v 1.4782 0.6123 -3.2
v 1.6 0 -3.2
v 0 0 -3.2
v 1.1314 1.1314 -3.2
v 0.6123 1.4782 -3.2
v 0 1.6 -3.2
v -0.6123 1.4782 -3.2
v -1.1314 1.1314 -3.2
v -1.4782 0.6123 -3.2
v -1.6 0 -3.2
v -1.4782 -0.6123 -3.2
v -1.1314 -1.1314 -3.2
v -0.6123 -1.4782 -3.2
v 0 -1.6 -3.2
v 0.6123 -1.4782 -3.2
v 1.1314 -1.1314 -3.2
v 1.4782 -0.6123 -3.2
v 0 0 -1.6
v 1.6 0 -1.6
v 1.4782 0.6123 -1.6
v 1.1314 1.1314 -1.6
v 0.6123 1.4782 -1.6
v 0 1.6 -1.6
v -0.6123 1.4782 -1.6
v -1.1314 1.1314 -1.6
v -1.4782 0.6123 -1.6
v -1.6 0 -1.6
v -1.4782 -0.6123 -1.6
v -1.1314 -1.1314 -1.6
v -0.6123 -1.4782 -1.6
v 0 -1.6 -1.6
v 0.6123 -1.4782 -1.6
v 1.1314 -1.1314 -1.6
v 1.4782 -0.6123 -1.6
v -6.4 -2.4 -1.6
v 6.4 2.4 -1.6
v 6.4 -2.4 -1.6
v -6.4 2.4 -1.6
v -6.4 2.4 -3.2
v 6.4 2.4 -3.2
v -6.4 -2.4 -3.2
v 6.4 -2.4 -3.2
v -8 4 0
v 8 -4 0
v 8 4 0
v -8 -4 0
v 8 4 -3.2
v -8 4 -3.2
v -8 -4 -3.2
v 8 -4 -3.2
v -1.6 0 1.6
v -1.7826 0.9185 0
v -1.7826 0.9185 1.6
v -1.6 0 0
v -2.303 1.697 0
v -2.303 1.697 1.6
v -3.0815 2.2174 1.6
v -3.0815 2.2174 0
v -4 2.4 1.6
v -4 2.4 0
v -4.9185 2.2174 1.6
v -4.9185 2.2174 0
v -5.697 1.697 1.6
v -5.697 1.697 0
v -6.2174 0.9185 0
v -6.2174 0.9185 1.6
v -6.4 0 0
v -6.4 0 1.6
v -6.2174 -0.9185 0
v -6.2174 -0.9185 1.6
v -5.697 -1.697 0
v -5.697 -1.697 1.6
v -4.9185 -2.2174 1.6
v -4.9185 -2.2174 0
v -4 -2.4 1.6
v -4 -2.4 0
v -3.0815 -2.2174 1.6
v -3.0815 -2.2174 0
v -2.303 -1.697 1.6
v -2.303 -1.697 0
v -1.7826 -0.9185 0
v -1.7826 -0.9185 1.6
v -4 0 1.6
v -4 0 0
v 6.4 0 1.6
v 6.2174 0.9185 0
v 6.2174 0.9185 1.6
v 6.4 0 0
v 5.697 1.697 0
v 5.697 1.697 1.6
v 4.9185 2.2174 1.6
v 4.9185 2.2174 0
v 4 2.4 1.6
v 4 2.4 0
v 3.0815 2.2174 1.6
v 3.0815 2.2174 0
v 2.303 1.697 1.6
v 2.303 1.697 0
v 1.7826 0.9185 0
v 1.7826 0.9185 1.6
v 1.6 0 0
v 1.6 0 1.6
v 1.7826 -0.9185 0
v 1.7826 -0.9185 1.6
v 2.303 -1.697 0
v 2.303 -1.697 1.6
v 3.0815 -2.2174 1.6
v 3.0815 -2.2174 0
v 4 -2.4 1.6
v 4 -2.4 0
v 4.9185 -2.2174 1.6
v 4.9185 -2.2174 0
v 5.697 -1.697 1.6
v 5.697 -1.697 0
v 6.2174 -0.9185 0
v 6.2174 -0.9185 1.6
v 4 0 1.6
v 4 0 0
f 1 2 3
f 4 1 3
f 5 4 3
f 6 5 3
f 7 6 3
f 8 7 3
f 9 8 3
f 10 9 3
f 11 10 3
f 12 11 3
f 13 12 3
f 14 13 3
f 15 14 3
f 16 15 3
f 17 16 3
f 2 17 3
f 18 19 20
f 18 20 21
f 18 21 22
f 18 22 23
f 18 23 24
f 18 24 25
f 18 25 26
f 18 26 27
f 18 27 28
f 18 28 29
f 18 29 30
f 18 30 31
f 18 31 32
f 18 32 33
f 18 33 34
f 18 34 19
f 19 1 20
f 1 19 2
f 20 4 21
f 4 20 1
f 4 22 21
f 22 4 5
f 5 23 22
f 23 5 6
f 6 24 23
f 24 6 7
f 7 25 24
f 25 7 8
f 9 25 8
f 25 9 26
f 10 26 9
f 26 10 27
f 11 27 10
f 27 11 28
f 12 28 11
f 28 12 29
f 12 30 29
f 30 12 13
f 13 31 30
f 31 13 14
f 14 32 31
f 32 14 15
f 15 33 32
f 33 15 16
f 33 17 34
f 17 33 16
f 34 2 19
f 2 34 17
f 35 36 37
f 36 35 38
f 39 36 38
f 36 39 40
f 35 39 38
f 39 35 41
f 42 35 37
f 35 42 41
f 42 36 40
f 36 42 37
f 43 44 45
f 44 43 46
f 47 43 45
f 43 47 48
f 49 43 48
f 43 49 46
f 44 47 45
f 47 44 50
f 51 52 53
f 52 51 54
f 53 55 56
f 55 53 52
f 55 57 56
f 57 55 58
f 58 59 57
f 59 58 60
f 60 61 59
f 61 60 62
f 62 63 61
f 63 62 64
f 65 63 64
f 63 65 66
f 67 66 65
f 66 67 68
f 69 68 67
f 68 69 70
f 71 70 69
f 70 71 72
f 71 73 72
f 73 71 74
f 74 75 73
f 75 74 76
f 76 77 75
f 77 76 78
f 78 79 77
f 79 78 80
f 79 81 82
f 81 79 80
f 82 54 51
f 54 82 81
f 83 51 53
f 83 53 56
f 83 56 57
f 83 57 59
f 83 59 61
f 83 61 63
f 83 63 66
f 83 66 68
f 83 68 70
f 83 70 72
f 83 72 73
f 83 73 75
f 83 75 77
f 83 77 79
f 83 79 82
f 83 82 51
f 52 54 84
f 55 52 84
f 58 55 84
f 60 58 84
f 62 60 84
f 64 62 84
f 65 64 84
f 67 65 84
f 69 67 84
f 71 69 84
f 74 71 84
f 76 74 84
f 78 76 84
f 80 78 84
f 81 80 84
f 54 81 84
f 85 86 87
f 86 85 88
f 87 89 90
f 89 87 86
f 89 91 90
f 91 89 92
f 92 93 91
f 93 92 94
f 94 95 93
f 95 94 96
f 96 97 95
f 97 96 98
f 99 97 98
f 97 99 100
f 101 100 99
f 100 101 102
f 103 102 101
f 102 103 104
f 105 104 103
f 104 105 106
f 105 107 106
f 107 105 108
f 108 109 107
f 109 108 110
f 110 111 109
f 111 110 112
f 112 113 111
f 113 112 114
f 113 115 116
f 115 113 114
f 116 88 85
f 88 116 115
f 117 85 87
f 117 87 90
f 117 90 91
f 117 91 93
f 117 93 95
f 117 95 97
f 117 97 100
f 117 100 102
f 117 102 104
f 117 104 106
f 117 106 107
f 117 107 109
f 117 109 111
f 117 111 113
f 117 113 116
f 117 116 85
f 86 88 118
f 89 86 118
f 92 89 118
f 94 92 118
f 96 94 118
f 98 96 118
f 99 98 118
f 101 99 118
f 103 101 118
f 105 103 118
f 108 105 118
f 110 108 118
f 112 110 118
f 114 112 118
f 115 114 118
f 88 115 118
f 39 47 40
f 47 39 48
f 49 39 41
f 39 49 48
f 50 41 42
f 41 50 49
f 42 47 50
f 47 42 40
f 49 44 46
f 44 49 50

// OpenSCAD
// file: ../p/stud.scad
use <../lib.scad>
use <4-4cyli.scad>
use <4-4disc.scad>
use <4-4edge.scad>
function ldraw_lib__stud() = [
// 0 Stud
// 0 Name: stud.dat
// 0 Author: James Jessiman
// 0 !LDRAW_ORG Primitive UPDATE 2012-01
// 0 !LICENSE Licensed under CC BY 4.0 : see CAreadme.txt
// 
// 0 BFC CERTIFY CCW
  [0,"BFC","CERTIFY"],
  [0,"BFC","CCW"],
// 
// 0 !HISTORY 2002-04-04 [sbliss] Modified for BFC compliance
// 0 !HISTORY 2002-04-25 [PTadmin] Official Update 2002-02
// 0 !HISTORY 2007-06-24 [PTadmin] Header formatted for Contributor Agreement
// 0 !HISTORY 2008-07-01 [PTadmin] Official Update 2008-01
// 0 !HISTORY 2012-02-16 [Philo] Changed to CCW
// 0 !HISTORY 2012-03-30 [PTadmin] Official Update 2012-01
// 
// 
// 1 16 0 0 0 6 0 0 0 1 0 0 0 6 4-4edge.dat
  [1,16,0,0,0,6,0,0,0,1,0,0,0,6, ldraw_lib__4_4edge()],
// 1 16 0 -4 0 6 0 0 0 1 0 0 0 6 4-4edge.dat
  [1,16,0,-4,0,6,0,0,0,1,0,0,0,6, ldraw_lib__4_4edge()],
// 1 16 0 0 0 6 0 0 0 -4 0 0 0 6 4-4cyli.dat
  [1,16,0,0,0,6,0,0,0,-4,0,0,0,6, ldraw_lib__4_4cyli()],
// 1 16 0 -4 0 6 0 0 0 1 0 0 0 6 4-4disc.dat
  [1,16,0,-4,0,6,0,0,0,1,0,0,0,6, ldraw_lib__4_4disc()],
  [-1,16,0,0,0,6,0,0,0,-1,0,0,0,6, ldraw_lib__4_4disc()],
];
module ldraw_lib__stud(step=0, col=false, unit=2/5, alt=false, line=0.2, solid=!$preview)
    makepoly(ldraw_lib__stud(), step=step, col=col, unit=unit, alt=alt, line=line, solid=solid);
ldraw_lib__stud(line=0.2);
// file: ../p/4-4edge.scad
use <../lib.scad>
function ldraw_lib__4_4edge() = [
// 0 Circle 1.0
// 0 Name: 4-4edge.dat
// 0 Author: James Jessiman
// 0 !LDRAW_ORG Primitive UPDATE 2017-01
// 0 !LICENSE Licensed under CC BY 2.0 and CC BY 4.0 : see CAreadme.txt
// 
// 0 BFC CERTIFY CCW
  [0,"BFC","CERTIFY"],
  [0,"BFC","CCW"],
// 
// 0 !HISTORY 1998-12-15 [PTadmin] Official Update 1998-10
// 0 !HISTORY 2005-12-28 [PTadmin] Official Update 2005-01
// 0 !HISTORY 2007-06-24 [PTadmin] Header formatted for Contributor Agreement
// 0 !HISTORY 2008-07-01 [PTadmin] Official Update 2008-01
// 0 !HISTORY 2017-01-15 [Steffen] BFCed
// 0 !HISTORY 2017-12-30 [PTadmin] Official Update 2017-01
// 
// 
// 2 24 1 0 0 0.9239 0 0.3827
  [2,24,1,0,0,0.9239,0,0.3827],
// 2 24 0.9239 0 0.3827 0.7071 0 0.7071
  [2,24,0.9239,0,0.3827,0.7071,0,0.7071],
// 2 24 0.7071 0 0.7071 0.3827 0 0.9239
  [2,24,0.7071,0,0.7071,0.3827,0,0.9239],
// 2 24 0.3827 0 0.9239 0 0 1
  [2,24,0.3827,0,0.9239,0,0,1],
// 2 24 0 0 1 -0.3827 0 0.9239
  [2,24,0,0,1,-0.3827,0,0.9239],
// 2 24 -0.3827 0 0.9239 -0.7071 0 0.7071
  [2,24,-0.3827,0,0.9239,-0.7071,0,0.7071],
// 2 24 -0.7071 0 0.7071 -0.9239 0 0.3827
  [2,24,-0.7071,0,0.7071,-0.9239,0,0.3827],
// 2 24 -0.9239 0 0.3827 -1 0 -0
  [2,24,-0.9239,0,0.3827,-1,0,-0],
// 2 24 -1 0 -0 -0.9239 0 -0.3827
  [2,24,-1,0,-0,-0.9239,0,-0.3827],
// 2 24 -0.9239 0 -0.3827 -0.7071 0 -0.7071
  [2,24,-0.9239,0,-0.3827,-0.7071,0,-0.7071],
// 2 24 -0.7071 0 -0.7071 -0.3827 0 -0.9239
  [2,24,-0.7071,0,-0.7071,-0.3827,0,-0.9239],
// 2 24 -0.3827 0 -0.9239 0 0 -1
  [2,24,-0.3827,0,-0.9239,0,0,-1],
// 2 24 0 0 -1 0.3827 0 -0.9239
  [2,24,0,0,-1,0.3827,0,-0.9239],
// 2 24 0.3827 0 -0.9239 0.7071 0 -0.7071
  [2,24,0.3827,0,-0.9239,0.7071,0,-0.7071],
// 2 24 0.7071 0 -0.7071 0.9239 0 -0.3827
  [2,24,0.7071,0,-0.7071,0.9239,0,-0.3827],
// 2 24 0.9239 0 -0.3827 1 0 0
  [2,24,0.9239,0,-0.3827,1,0,0],
];
module ldraw_lib__4_4edge(step=0, col=false, unit=2/5, alt=false, line=0.2, solid=!$preview)
    makepoly(ldraw_lib__4_4edge(), step=step, col=col, unit=unit, alt=alt, line=line, solid=solid);
ldraw_lib__4_4edge(line=0.2);
// file: ../p/4-4disc.scad
use <../lib.scad>
function ldraw_lib__4_4disc() = [
// 0 Disc 1.0
// 0 Name: 4-4disc.dat
// 0 Author: James Jessiman
// 0 !LDRAW_ORG Primitive UPDATE 2002-02
// 0 !LICENSE Licensed under CC BY 2.0 and CC BY 4.0 : see CAreadme.txt
// 
// 0 BFC CERTIFY CCW
  [0,"BFC","CERTIFY"],
  [0,"BFC","CCW"],
// 
// 0 !HISTORY 1998-12-15 [PTadmin] Official Update 1998-10
// 0 !HISTORY 2002-03-23 [sbliss] Added BFC statement
// 0 !HISTORY 2002-04-25 [PTadmin] Official Update 2002-02
// 0 !HISTORY 2007-06-24 [PTadmin] Header formatted for Contributor Agreement
// 0 !HISTORY 2008-07-01 [PTadmin] Official Update 2008-01
// 
// 
// 3 16 0 0 0 1 0 0 0.9239 0 0.3827
  [3,16,0,0,0,1,0,0,0.9239,0,0.3827],
// 3 16 0 0 0 0.9239 0 0.3827 0.7071 0 0.7071
  [3,16,0,0,0,0.9239,0,0.3827,0.7071,0,0.7071],
// 3 16 0 0 0 0.7071 0 0.7071 0.3827 0 0.9239
  [3,16,0,0,0,0.7071,0,0.7071,0.3827,0,0.9239],
// 3 16 0 0 0 0.3827 0 0.9239 0 0 1
  [3,16,0,0,0,0.3827,0,0.9239,0,0,1],
// 3 16 0 0 0 0 0 1 -0.3827 0 0.9239
  [3,16,0,0,0,0,0,1,-0.3827,0,0.9239],
// 3 16 0 0 0 -0.3827 0 0.9239 -0.7071 0 0.7071
  [3,16,0,0,0,-0.3827,0,0.9239,-0.7071,0,0.7071],
// 3 16 0 0 0 -0.7071 0 0.7071 -0.9239 0 0.3827
  [3,16,0,0,0,-0.7071,0,0.7071,-0.9239,0,0.3827],
// 3 16 0 0 0 -0.9239 0 0.3827 -1 0 -0
  [3,16,0,0,0,-0.9239,0,0.3827,-1,0,-0],
// 3 16 0 0 0 -1 0 -0 -0.9239 0 -0.3827
  [3,16,0,0,0,-1,0,-0,-0.9239,0,-0.3827],
// 3 16 0 0 0 -0.9239 0 -0.3827 -0.7071 0 -0.7071
  [3,16,0,0,0,-0.9239,0,-0.3827,-0.7071,0,-0.7071],
// 3 16 0 0 0 -0.7071 0 -0.7071 -0.3827 0 -0.9239
  [3,16,0,0,0,-0.7071,0,-0.7071,-0.3827,0,-0.9239],
// 3 16 0 0 0 -0.3827 0 -0.9239 0 0 -1
  [3,16,0,0,0,-0.3827,0,-0.9239,0,0,-1],
// 3 16 0 0 0 0 0 -1 0.3827 0 -0.9239
  [3,16,0,0,0,0,0,-1,0.3827,0,-0.9239],
// 3 16 0 0 0 0.3827 0 -0.9239 0.7071 0 -0.7071
  [3,16,0,0,0,0.3827,0,-0.9239,0.7071,0,-0.7071],
// 3 16 0 0 0 0.7071 0 -0.7071 0.9239 0 -0.3827
  [3,16,0,0,0,0.7071,0,-0.7071,0.9239,0,-0.3827],
// 3 16 0 0 0 0.9239 0 -0.3827 1 0 0
  [3,16,0,0,0,0.9239,0,-0.3827,1,0,0],
// 0
];
module ldraw_lib__4_4disc(step=0, col=false, unit=2/5, alt=false, line=0.2, solid=!$preview)
    makepoly(ldraw_lib__4_4disc(), step=step, col=col, unit=unit, alt=alt, line=line, solid=solid);
ldraw_lib__4_4disc(line=0.2);
// file: ../p/4-4cyli.scad
use <../lib.scad>
$fa=1; $fs=0.2;
function ldraw_lib__4_4cyli(realsolid=false) = [
// 0 Cylinder 1.0
// 0 Name: 4-4cyli.dat
// 0 Author: James Jessiman
// 0 !LDRAW_ORG Primitive UPDATE 2005-01
// 0 !LICENSE Licensed under CC BY 2.0 and CC BY 4.0 : see CAreadme.txt
// 
// 0 BFC CERTIFY CCW
  [0,"BFC","CERTIFY"],
  [0,"BFC","CCW"],
// 
// 0 !HISTORY 1998-12-15 [PTadmin] Official Update 1998-10
// 0 !HISTORY 2002-03-23 [sbliss] Added BFC statement; merged headers from files in distributions LDraw 0.27 and Complete.
// 0 !HISTORY 2002-04-25 [PTadmin] Official Update 2002-02
// 0 !HISTORY 2004-12-14 [guyvivan] BFC CCW
// 0 !HISTORY 2005-12-28 [PTadmin] Official Update 2005-01
// 0 !HISTORY 2007-06-24 [PTadmin] Header formatted for Contributor Agreement
// 0 !HISTORY 2008-07-01 [PTadmin] Official Update 2008-01
// 
// 
// 4 16 1 1 0 0.9239 1 0.3827 0.9239 0 0.3827 1 0 0
  [4,16,1,1,0,0.9239,1,0.3827,0.9239,0,0.3827,1,0,0],
// 5 24 1 0 0 1 1 0 0.9239 0 0.3827 0.9239 0 -0.3827
  [5,24,1,0,0,1,1,0,0.9239,0,0.3827,0.9239,0,-0.3827],
// 4 16 0.9239 1 0.3827 0.7071 1 0.7071 0.7071 0 0.7071 0.9239 0 0.3827
  [4,16,0.9239,1,0.3827,0.7071,1,0.7071,0.7071,0,0.7071,0.9239,0,0.3827],
// 5 24 0.9239 0 0.3827 0.9239 1 0.3827 0.7071 0 0.7071 1 0 0
  [5,24,0.9239,0,0.3827,0.9239,1,0.3827,0.7071,0,0.7071,1,0,0],
// 4 16 0.7071 1 0.7071 0.3827 1 0.9239 0.3827 0 0.9239 0.7071 0 0.7071
  [4,16,0.7071,1,0.7071,0.3827,1,0.9239,0.3827,0,0.9239,0.7071,0,0.7071],
// 5 24 0.7071 0 0.7071 0.7071 1 0.7071 0.3827 0 0.9239 0.9239 0 0.3827
  [5,24,0.7071,0,0.7071,0.7071,1,0.7071,0.3827,0,0.9239,0.9239,0,0.3827],
// 4 16 0.3827 1 0.9239 0 1 1 0 0 1 0.3827 0 0.9239
  [4,16,0.3827,1,0.9239,0,1,1,0,0,1,0.3827,0,0.9239],
// 5 24 0.3827 0 0.9239 0.3827 1 0.9239 0 0 1 0.7071 0 0.7071
  [5,24,0.3827,0,0.9239,0.3827,1,0.9239,0,0,1,0.7071,0,0.7071],
// 4 16 0 1 1 -0.3827 1 0.9239 -0.3827 0 0.9239 0 0 1
  [4,16,0,1,1,-0.3827,1,0.9239,-0.3827,0,0.9239,0,0,1],
// 5 24 0 0 1 0 1 1 -0.3827 0 0.9239 0.3827 0 0.9239
  [5,24,0,0,1,0,1,1,-0.3827,0,0.9239,0.3827,0,0.9239],
// 4 16 -0.3827 1 0.9239 -0.7071 1 0.7071 -0.7071 0 0.7071 -0.3827 0 0.9239
  [4,16,-0.3827,1,0.9239,-0.7071,1,0.7071,-0.7071,0,0.7071,-0.3827,0,0.9239],
// 5 24 -0.3827 0 0.9239 -0.3827 1 0.9239 -0.7071 0 0.7071 0 0 1
  [5,24,-0.3827,0,0.9239,-0.3827,1,0.9239,-0.7071,0,0.7071,0,0,1],
// 4 16 -0.7071 1 0.7071 -0.9239 1 0.3827 -0.9239 0 0.3827 -0.7071 0 0.7071
  [4,16,-0.7071,1,0.7071,-0.9239,1,0.3827,-0.9239,0,0.3827,-0.7071,0,0.7071],
// 5 24 -0.7071 0 0.7071 -0.7071 1 0.7071 -0.9239 0 0.3827 -0.3827 0 0.9239
  [5,24,-0.7071,0,0.7071,-0.7071,1,0.7071,-0.9239,0,0.3827,-0.3827,0,0.9239],
// 4 16 -0.9239 1 0.3827 -1 1 0 -1 0 0 -0.9239 0 0.3827
  [4,16,-0.9239,1,0.3827,-1,1,0,-1,0,0,-0.9239,0,0.3827],
// 5 24 -0.9239 0 0.3827 -0.9239 1 0.3827 -1 0 0 -0.7071 0 0.7071
  [5,24,-0.9239,0,0.3827,-0.9239,1,0.3827,-1,0,0,-0.7071,0,0.7071],
// 4 16 -1 1 0 -0.9239 1 -0.3827 -0.9239 0 -0.3827 -1 0 0
  [4,16,-1,1,0,-0.9239,1,-0.3827,-0.9239,0,-0.3827,-1,0,0],
// 5 24 -1 0 0 -1 1 0 -0.9239 0 -0.3827 -0.9239 0 0.3827
  [5,24,-1,0,0,-1,1,0,-0.9239,0,-0.3827,-0.9239,0,0.3827],
// 4 16 -0.9239 1 -0.3827 -0.7071 1 -0.7071 -0.7071 0 -0.7071 -0.9239 0 -0.3827
  [4,16,-0.9239,1,-0.3827,-0.7071,1,-0.7071,-0.7071,0,-0.7071,-0.9239,0,-0.3827],
// 5 24 -0.9239 0 -0.3827 -0.9239 1 -0.3827 -0.7071 0 -0.7071 -1 0 0
  [5,24,-0.9239,0,-0.3827,-0.9239,1,-0.3827,-0.7071,0,-0.7071,-1,0,0],
// 4 16 -0.7071 1 -0.7071 -0.3827 1 -0.9239 -0.3827 0 -0.9239 -0.7071 0 -0.7071
  [4,16,-0.7071,1,-0.7071,-0.3827,1,-0.9239,-0.3827,0,-0.9239,-0.7071,0,-0.7071],
// 5 24 -0.7071 0 -0.7071 -0.7071 1 -0.7071 -0.3827 0 -0.9239 -0.9239 0 -0.3827
  [5,24,-0.7071,0,-0.7071,-0.7071,1,-0.7071,-0.3827,0,-0.9239,-0.9239,0,-0.3827],
// 4 16 -0.3827 1 -0.9239 0 1 -1 0 0 -1 -0.3827 0 -0.9239
  [4,16,-0.3827,1,-0.9239,0,1,-1,0,0,-1,-0.3827,0,-0.9239],
// 5 24 -0.3827 0 -0.9239 -0.3827 1 -0.9239 0 0 -1 -0.7071 0 -0.7071
  [5,24,-0.3827,0,-0.9239,-0.3827,1,-0.9239,0,0,-1,-0.7071,0,-0.7071],
// 4 16 0 1 -1 0.3827 1 -0.9239 0.3827 0 -0.9239 0 0 -1
  [4,16,0,1,-1,0.3827,1,-0.9239,0.3827,0,-0.9239,0,0,-1],
// 5 24 0 0 -1 0 1 -1 0.3827 0 -0.9239 -0.3827 0 -0.9239
  [5,24,0,0,-1,0,1,-1,0.3827,0,-0.9239,-0.3827,0,-0.9239],
// 4 16 0.3827 1 -0.9239 0.7071 1 -0.7071 0.7071 0 -0.7071 0.3827 0 -0.9239
  [4,16,0.3827,1,-0.9239,0.7071,1,-0.7071,0.7071,0,-0.7071,0.3827,0,-0.9239],
// 5 24 0.3827 0 -0.9239 0.3827 1 -0.9239 0.7071 0 -0.7071 0 0 -1
  [5,24,0.3827,0,-0.9239,0.3827,1,-0.9239,0.7071,0,-0.7071,0,0,-1],
// 4 16 0.7071 1 -0.7071 0.9239 1 -0.3827 0.9239 0 -0.3827 0.7071 0 -0.7071
  [4,16,0.7071,1,-0.7071,0.9239,1,-0.3827,0.9239,0,-0.3827,0.7071,0,-0.7071],
// 5 24 0.7071 0 -0.7071 0.7071 1 -0.7071 0.9239 0 -0.3827 0.3827 0 -0.9239
  [5,24,0.7071,0,-0.7071,0.7071,1,-0.7071,0.9239,0,-0.3827,0.3827,0,-0.9239],
// 4 16 0.9239 1 -0.3827 1 1 0 1 0 0 0.9239 0 -0.3827
  [4,16,0.9239,1,-0.3827,1,1,0,1,0,0,0.9239,0,-0.3827],
// 5 24 0.9239 0 -0.3827 0.9239 1 -0.3827 1 0 0 0.7071 0 -0.7071
  [5,24,0.9239,0,-0.3827,0.9239,1,-0.3827,1,0,0,0.7071,0,-0.7071],
// 0
];
module ldraw_lib__4_4cyli(step=0, col=false, unit=2/5, alt=false, line=0.2, solid=!$preview)
    makepoly(ldraw_lib__4_4cyli(solid), step=step, col=col, unit=unit, alt=alt, line=line, solid=solid);
ldraw_lib__4_4cyli(line=0.2);
// file: ../p/stug-1x2.scad
use <../lib.scad>
use <stud.scad>
$fa=1; $fs=0.2;
function ldraw_lib__stug_1x2(realsolid=false) = [
// 0 Stud Group  1 x  2
// 0 Name: stug-1x2.dat
// 0 Author: Steffen [Steffen]
// 0 !LDRAW_ORG Primitive UPDATE 2011-01
// 0 !LICENSE Licensed under CC BY 2.0 and CC BY 4.0 : see CAreadme.txt
// 
// 0 BFC CERTIFY CCW
  [0,"BFC","CERTIFY"],
  [0,"BFC","CCW"],
// 
// 0 !HISTORY 2011-07-25 [PTadmin] Official Update 2011-01
// 
// 
// 1 16 -10 0 0 1 0 0 0 1 0 0 0 1 stud.dat
  [1,16,-10,0,0,1,0,0,0,1,0,0,0,1, ldraw_lib__stud(realsolid)],
// 1 16 10 0 0 1 0 0 0 1 0 0 0 1 stud.dat
  [1,16,10,0,0,1,0,0,0,1,0,0,0,1, ldraw_lib__stud(realsolid)],
];
module ldraw_lib__stug_1x2(step=0, col=false, unit=2/5, alt=false, line=0.2, solid=!$preview)
    makepoly(ldraw_lib__stug_1x2(solid), step=step, col=col, unit=unit, alt=alt, line=line, solid=solid);
ldraw_lib__stug_1x2(line=0.2);
// file: ../p/stud3.scad
use <../lib.scad>
use <4-4cyli.scad>
use <4-4disc.scad>
use <4-4edge.scad>
function ldraw_lib__stud3() = [
// 0 Stud Tube Solid
// 0 Name: stud3.dat
// 0 Author: James Jessiman
// 0 !LDRAW_ORG Primitive UPDATE 2012-01
// 0 !LICENSE Licensed under CC BY 4.0 : see CAreadme.txt
// 
// 0 BFC CERTIFY CCW
  [0,"BFC","CERTIFY"],
  [0,"BFC","CCW"],
// 
// 0 !HISTORY 2002-04-04 [sbliss] Modified for BFC compliance
// 0 !HISTORY 2002-04-25 [PTadmin] Official Update 2002-02
// 0 !HISTORY 2007-06-24 [PTadmin] Header formatted for Contributor Agreement
// 0 !HISTORY 2008-07-01 [PTadmin] Official Update 2008-01
// 0 !HISTORY 2012-02-16 [Philo] Changed to CCW
// 0 !HISTORY 2012-03-30 [PTadmin] Official Update 2012-01
// 
// 
// 1 16 0 -4 0 4 0 0 0 1 0 0 0 4 4-4edge.dat
  [1,16,0,-4,0,4,0,0,0,1,0,0,0,4, ldraw_lib__4_4edge()],
// 1 16 0 0 0 4 0 0 0 1 0 0 0 4 4-4edge.dat
  [1,16,0,0,0,4,0,0,0,1,0,0,0,4, ldraw_lib__4_4edge()],
// 1 16 0 -4 0 4 0 0 0 1 0 0 0 4 4-4disc.dat
  [1,16,0,-4,0,4,0,0,0,1,0,0,0,4, ldraw_lib__4_4disc()],
  [-1,16,0,0,0,4,0,0,0,-1,0,0,0,4, ldraw_lib__4_4disc()],
// 1 16 0 -4 0 4 0 0 0 4 0 0 0 4 4-4cyli.dat
  [1,16,0,-4,0,4,0,0,0,4,0,0,0,4, ldraw_lib__4_4cyli()],
];
module ldraw_lib__stud3(step=0, col=false, unit=2/5, alt=false, line=0.2, solid=!$preview)
    makepoly(ldraw_lib__stud3(), step=step, col=col, unit=unit, alt=alt, line=line, solid=solid);
ldraw_lib__stud3(line=0.2);
// file: ../p/box5.scad
use <../lib.scad>
function ldraw_lib__box5() = [
// 0 Box with 5 Faces and All Edges
// 0 Name: box5.dat
// 0 Author: James Jessiman
// 0 !LDRAW_ORG Primitive UPDATE 2012-01
// 0 !LICENSE Licensed under CC BY 2.0 and CC BY 4.0 : see CAreadme.txt
// 
// 0 BFC CERTIFY CCW
  [0,"BFC","CERTIFY"],
  [0,"BFC","CCW"],
// 
// 0 !HISTORY 2002-04-03 [sbliss] Modified for BFC compliance
// 0 !HISTORY 2002-04-25 [PTadmin] Official Update 2002-02
// 0 !HISTORY 2007-06-24 [PTadmin] Header formatted for Contributor Agreement
// 0 !HISTORY 2008-07-01 [PTadmin] Official Update 2008-01
// 0 !HISTORY 2012-02-16 [Philo] Changed to CCW
// 0 !HISTORY 2012-03-30 [PTadmin] Official Update 2012-01
// 
// 
// 2 24 1 1 1 -1 1 1
  [2,24,1,1,1,-1,1,1],
// 2 24 -1 1 1 -1 1 -1
  [2,24,-1,1,1,-1,1,-1],
// 2 24 -1 1 -1 1 1 -1
  [2,24,-1,1,-1,1,1,-1],
// 2 24 1 1 -1 1 1 1
  [2,24,1,1,-1,1,1,1],
// 2 24 1 0 1 -1 0 1
  [2,24,1,0,1,-1,0,1],
// 2 24 -1 0 1 -1 0 -1
  [2,24,-1,0,1,-1,0,-1],
// 2 24 -1 0 -1 1 0 -1
  [2,24,-1,0,-1,1,0,-1],
// 2 24 1 0 -1 1 0 1
  [2,24,1,0,-1,1,0,1],
// 2 24 1 0 1 1 1 1
  [2,24,1,0,1,1,1,1],
// 2 24 -1 0 1 -1 1 1
  [2,24,-1,0,1,-1,1,1],
// 2 24 1 0 -1 1 1 -1
  [2,24,1,0,-1,1,1,-1],
// 2 24 -1 0 -1 -1 1 -1
  [2,24,-1,0,-1,-1,1,-1],
// 4 16 -1 1 1 1 1 1 1 1 -1 -1 1 -1
  [4,16,-1,1,1,1,1,1,1,1,-1,-1,1,-1],
// 4 16 -1 1 1 -1 0 1 1 0 1 1 1 1
  [4,16,-1,1,1,-1,0,1,1,0,1,1,1,1],
// 4 16 -1 1 -1 -1 0 -1 -1 0 1 -1 1 1
  [4,16,-1,1,-1,-1,0,-1,-1,0,1,-1,1,1],
// 4 16 1 1 -1 1 0 -1 -1 0 -1 -1 1 -1
  [4,16,1,1,-1,1,0,-1,-1,0,-1,-1,1,-1],
// 4 16 1 1 1 1 0 1 1 0 -1 1 1 -1
  [4,16,1,1,1,1,0,1,1,0,-1,1,1,-1],
];
makepoly(ldraw_lib__box5(), line=0.2);
// file: ../p/box4t.scad
use <../lib.scad>
function ldraw_lib__box4t() = [
// 0 Box with 4 Adjacent Faces and All Edges
// 0 Name: box4t.dat
// 0 Author: Tore Eriksson [Tore_Eriksson]
// 0 !LDRAW_ORG Primitive UPDATE 2003-02
// 0 !LICENSE Licensed under CC BY 2.0 and CC BY 4.0 : see CAreadme.txt
// 
// 0 BFC CERTIFY CCW
  [0,"BFC","CERTIFY"],
  [0,"BFC","CCW"],
// 
// 0 !HISTORY 1997-09-29 [PTadmin] Official Update 1997-15
// 0 !HISTORY 2002-08-31 [izanette] Modified with WINDZ for BFC compliance
// 0 !HISTORY 2003-08-01 [PTadmin] Official Update 2003-02
// 0 !HISTORY 2007-06-24 [PTadmin] Header formatted for Contributor Agreement
// 0 !HISTORY 2008-07-01 [PTadmin] Official Update 2008-01
// 
// 
// 2 24 1 1 1 -1 1 1
  [2,24,1,1,1,-1,1,1],
// 2 24 -1 1 1 -1 1 -1
  [2,24,-1,1,1,-1,1,-1],
// 2 24 -1 1 -1 1 1 -1
  [2,24,-1,1,-1,1,1,-1],
// 2 24 1 1 -1 1 1 1
  [2,24,1,1,-1,1,1,1],
// 2 24 1 0 1 -1 0 1
  [2,24,1,0,1,-1,0,1],
// 2 24 -1 0 1 -1 0 -1
  [2,24,-1,0,1,-1,0,-1],
// 2 24 -1 0 -1 1 0 -1
  [2,24,-1,0,-1,1,0,-1],
// 2 24 1 0 -1 1 0 1
  [2,24,1,0,-1,1,0,1],
// 2 24 1 0 1 1 1 1
  [2,24,1,0,1,1,1,1],
// 2 24 -1 0 1 -1 1 1
  [2,24,-1,0,1,-1,1,1],
// 2 24 1 0 -1 1 1 -1
  [2,24,1,0,-1,1,1,-1],
// 2 24 -1 0 -1 -1 1 -1
  [2,24,-1,0,-1,-1,1,-1],
// 4 16 1 1 1 1 1 -1 -1 1 -1 -1 1 1
  [4,16,1,1,1,1,1,-1,-1,1,-1,-1,1,1],
// 4 16 1 1 1 -1 1 1 -1 0 1 1 0 1
  [4,16,1,1,1,-1,1,1,-1,0,1,1,0,1],
// 4 16 -1 1 1 -1 1 -1 -1 0 -1 -1 0 1
  [4,16,-1,1,1,-1,1,-1,-1,0,-1,-1,0,1],
// 0 4 16 -1 1 -1 -1 0 -1 1 0 -1 1 1 -1
// 4 16 1 1 -1 1 1 1 1 0 1 1 0 -1
  [4,16,1,1,-1,1,1,1,1,0,1,1,0,-1],
// 0
];
makepoly(ldraw_lib__box4t(), line=0.2);
// file: s/3023bs01.scad
use <../../lib.scad>
use <../../p/box4t.scad>
use <../../p/box5.scad>
use <../../p/stud3.scad>
use <../../p/stug-1x2.scad>
function ldraw_lib__s__3023bs01() = [
// 0 ~Plate  1 x  2 without Front Face
// 0 Name: s\3023bs01.dat
// 0 Author: Massimo Maso [Sirio]
// 0 !LDRAW_ORG Subpart UPDATE 2023-03
// 0 !LICENSE Licensed under CC BY 4.0 : see CAreadme.txt
// 
// 0 BFC CERTIFY CCW
  [0,"BFC","CERTIFY"],
  [0,"BFC","CCW"],
// 
// 0 !HISTORY 2022-01-14 [PTadmin] Official Update 2022-01
// 0 !HISTORY 2023-05-27 [OrionP] Moved from s\3023s01.dat
// 0 !HISTORY 2023-06-24 [OrionP] Official Update 2023-03
// 
// 
// 0 // Primitves
// 1 16 0 4 0 1 0 0 0 -1 0 0 0 1 stud3.dat
  [1,16,0,4,0,1,0,0,0,-1,0,0,0,1, ldraw_lib__stud3()],
// 0 BFC INVERTNEXT
  [0,"BFC","INVERTNEXT"],
// 1 16 0 8 0 16 0 0 0 -4 0 0 0 6 box5.dat
  [1,16,0,8,0,16,0,0,0,-4,0,0,0,6, ldraw_lib__box5()],
// 1 16 0 8 0 20 0 0 0 -8 0 0 0 10 box4t.dat
  [1,16,0,8,0,20,0,0,0,-8,0,0,0,10, ldraw_lib__box4t()],
// 1 16 0 0 0 1 0 0 0 1 0 0 0 1 stug-1x2.dat
  [1,16,0,0,0,1,0,0,0,1,0,0,0,1, ldraw_lib__stug_1x2()],
// 0 // Faces
// 4 16 20 8 10 16 8 6 -16 8 6 -20 8 10
  [4,16,20,8,10,16,8,6,-16,8,6,-20,8,10],
// 4 16 -20 8 10 -16 8 6 -16 8 -6 -20 8 -10
  [4,16,-20,8,10,-16,8,6,-16,8,-6,-20,8,-10],
// 4 16 -20 8 -10 -16 8 -6 16 8 -6 20 8 -10
  [4,16,-20,8,-10,-16,8,-6,16,8,-6,20,8,-10],
// 4 16 20 8 -10 16 8 -6 16 8 6 20 8 10
  [4,16,20,8,-10,16,8,-6,16,8,6,20,8,10],
];
module ldraw_lib__s__3023bs01(step=0, col=false, unit=2/5, alt=false, line=0.2, solid=!$preview)
    makepoly(ldraw_lib__s__3023bs01(), step=step, col=col, unit=unit, alt=alt, line=line, solid=solid);
ldraw_lib__s__3023bs01(line=0.2);
// file: 3023b.scad
use <../lib.scad>
use <s/3023bs01.scad>
function ldraw_lib__3023b() = [
// 0 Plate  1 x  2
// 0 Name: 3023b.dat
// 0 Author: James Jessiman
// 0 !LDRAW_ORG Part UPDATE 2023-03
// 0 !LICENSE Licensed under CC BY 4.0 : see CAreadme.txt
// 
// 0 BFC CERTIFY CCW
  [0,"BFC","CERTIFY"],
  [0,"BFC","CCW"],
// 
// 0 !KEYWORDS BrickLink 3023, Rebrickable 3023
// 
// 0 !HISTORY 2001-10-26 [PTadmin] Official Update 2001-01
// 0 !HISTORY 2002-05-07 {unknown} BFC Certification
// 0 !HISTORY 2002-06-11 [PTadmin] Official Update 2002-03
// 0 !HISTORY 2007-06-07 [PTadmin] Header formatted for Contributor Agreement
// 0 !HISTORY 2008-07-01 [PTadmin] Official Update 2008-01
// 0 !HISTORY 2020-03-07 [Sirio] Subparted
// 0 !HISTORY 2022-01-14 [PTadmin] Official Update 2022-01
// 0 !HISTORY 2023-05-26 [OrionP] Moved from 3023.dat
// 0 !HISTORY 2023-06-24 [OrionP] Official Update 2023-03
// 
// 
// 1 16 0 0 0 1 0 0 0 1 0 0 0 1 s\3023bs01.dat
  [1,16,0,0,0,1,0,0,0,1,0,0,0,1, ldraw_lib__s__3023bs01()],
// 4 16 -20 0 -10 -20 8 -10 20 8 -10 20 0 -10
  [4,16,-20,0,-10,-20,8,-10,20,8,-10,20,0,-10],
];
module ldraw_lib__3023b(step=0, col=false, unit=2/5, alt=false, line=0.2, solid=!$preview)
    makepoly(ldraw_lib__3023b(), step=step, col=col, unit=unit, alt=alt, line=line, solid=solid);
ldraw_lib__3023b(line=0.2);
// file: 3023.scad
use <../lib.scad>
use <3023b.scad>
function ldraw_lib__3023() = [
// 0 ~Moved to 3023b
// 0 Name: 3023.dat
// 0 Author: Orion Pobursky [OrionP]
// 0 !LDRAW_ORG Part UPDATE 2024-07
// 0 !LICENSE Licensed under CC BY 4.0 : see CAreadme.txt
// 
// 0 BFC CERTIFY CCW
  [0,"BFC","CERTIFY"],
  [0,"BFC","CCW"],
// 
// 0 !HISTORY 2023-06-24 [OrionP] Official Update 2023-03
// 0 !HISTORY 2024-08-10 [MagFors] Update description
// 0 !HISTORY 2024-08-26 [OrionP] Official Update 2024-07
// 
// 1 16 0 0 0 1 0 0 0 1 0 0 0 1 3023b.dat
  [1,16,0,0,0,1,0,0,0,1,0,0,0,1, ldraw_lib__3023b()],
];
module ldraw_lib__3023(step=0, col=false, unit=2/5, alt=false, line=0.2, solid=!$preview)
    makepoly(ldraw_lib__3023(), step=step, col=col, unit=unit, alt=alt, line=line, solid=solid);
ldraw_lib__3023(line=0.2);
// main file
use <../lib.scad>
use <3023.scad>
function ldraw_lib__4211063() = [
// 0 ~_Plate  1 x  2 Dark Bluish Grey (Obsolete)
// 0 Name: 4211063.dat
// 0 Author: [PTadmin]
// 0 !LDRAW_ORG Part Physical_Colour UPDATE 2022-01
// 0 !LICENSE Licensed under CC BY 4.0 : see CAreadme.txt
// 
// 0 BFC CERTIFY CCW
  [0,"BFC","CERTIFY"],
  [0,"BFC","CCW"],
// 
// 0 !CATEGORY Obsolete
// 
// 0 !HISTORY 2010-12-31 [PTadmin] Official Update 2010-03
// 0 !HISTORY 2019-08-13 [Holly-Wood] Obsoleted per decision not to include physical colour parts
// 0 !HISTORY 2019-09-09 [PTadmin] Official Update 2019-02
// 0 !HISTORY 2021-01-16 [cwdee] Update description
// 0 !HISTORY 2022-01-14 [PTadmin] Official Update 2022-01
// 
// 
// 0 // This file is a "shortcut" with the correct number for the actual
// 0 // colouring of the part (Dark_Bluish_Grey).
// 
// 1 72 0 0 0 1 0 0 0 1 0 0 0 1 3023.dat
  [1,72,0,0,0,1,0,0,0,1,0,0,0,1, ldraw_lib__3023()],
];
module ldraw_lib__4211063(step=0, col=false, unit=2/5, alt=false, line=0.2, solid=!$preview)
    makepoly(ldraw_lib__4211063(), step=step, col=col, unit=unit, alt=alt, line=line, solid=solid);
ldraw_lib__4211063(line=0.2);
